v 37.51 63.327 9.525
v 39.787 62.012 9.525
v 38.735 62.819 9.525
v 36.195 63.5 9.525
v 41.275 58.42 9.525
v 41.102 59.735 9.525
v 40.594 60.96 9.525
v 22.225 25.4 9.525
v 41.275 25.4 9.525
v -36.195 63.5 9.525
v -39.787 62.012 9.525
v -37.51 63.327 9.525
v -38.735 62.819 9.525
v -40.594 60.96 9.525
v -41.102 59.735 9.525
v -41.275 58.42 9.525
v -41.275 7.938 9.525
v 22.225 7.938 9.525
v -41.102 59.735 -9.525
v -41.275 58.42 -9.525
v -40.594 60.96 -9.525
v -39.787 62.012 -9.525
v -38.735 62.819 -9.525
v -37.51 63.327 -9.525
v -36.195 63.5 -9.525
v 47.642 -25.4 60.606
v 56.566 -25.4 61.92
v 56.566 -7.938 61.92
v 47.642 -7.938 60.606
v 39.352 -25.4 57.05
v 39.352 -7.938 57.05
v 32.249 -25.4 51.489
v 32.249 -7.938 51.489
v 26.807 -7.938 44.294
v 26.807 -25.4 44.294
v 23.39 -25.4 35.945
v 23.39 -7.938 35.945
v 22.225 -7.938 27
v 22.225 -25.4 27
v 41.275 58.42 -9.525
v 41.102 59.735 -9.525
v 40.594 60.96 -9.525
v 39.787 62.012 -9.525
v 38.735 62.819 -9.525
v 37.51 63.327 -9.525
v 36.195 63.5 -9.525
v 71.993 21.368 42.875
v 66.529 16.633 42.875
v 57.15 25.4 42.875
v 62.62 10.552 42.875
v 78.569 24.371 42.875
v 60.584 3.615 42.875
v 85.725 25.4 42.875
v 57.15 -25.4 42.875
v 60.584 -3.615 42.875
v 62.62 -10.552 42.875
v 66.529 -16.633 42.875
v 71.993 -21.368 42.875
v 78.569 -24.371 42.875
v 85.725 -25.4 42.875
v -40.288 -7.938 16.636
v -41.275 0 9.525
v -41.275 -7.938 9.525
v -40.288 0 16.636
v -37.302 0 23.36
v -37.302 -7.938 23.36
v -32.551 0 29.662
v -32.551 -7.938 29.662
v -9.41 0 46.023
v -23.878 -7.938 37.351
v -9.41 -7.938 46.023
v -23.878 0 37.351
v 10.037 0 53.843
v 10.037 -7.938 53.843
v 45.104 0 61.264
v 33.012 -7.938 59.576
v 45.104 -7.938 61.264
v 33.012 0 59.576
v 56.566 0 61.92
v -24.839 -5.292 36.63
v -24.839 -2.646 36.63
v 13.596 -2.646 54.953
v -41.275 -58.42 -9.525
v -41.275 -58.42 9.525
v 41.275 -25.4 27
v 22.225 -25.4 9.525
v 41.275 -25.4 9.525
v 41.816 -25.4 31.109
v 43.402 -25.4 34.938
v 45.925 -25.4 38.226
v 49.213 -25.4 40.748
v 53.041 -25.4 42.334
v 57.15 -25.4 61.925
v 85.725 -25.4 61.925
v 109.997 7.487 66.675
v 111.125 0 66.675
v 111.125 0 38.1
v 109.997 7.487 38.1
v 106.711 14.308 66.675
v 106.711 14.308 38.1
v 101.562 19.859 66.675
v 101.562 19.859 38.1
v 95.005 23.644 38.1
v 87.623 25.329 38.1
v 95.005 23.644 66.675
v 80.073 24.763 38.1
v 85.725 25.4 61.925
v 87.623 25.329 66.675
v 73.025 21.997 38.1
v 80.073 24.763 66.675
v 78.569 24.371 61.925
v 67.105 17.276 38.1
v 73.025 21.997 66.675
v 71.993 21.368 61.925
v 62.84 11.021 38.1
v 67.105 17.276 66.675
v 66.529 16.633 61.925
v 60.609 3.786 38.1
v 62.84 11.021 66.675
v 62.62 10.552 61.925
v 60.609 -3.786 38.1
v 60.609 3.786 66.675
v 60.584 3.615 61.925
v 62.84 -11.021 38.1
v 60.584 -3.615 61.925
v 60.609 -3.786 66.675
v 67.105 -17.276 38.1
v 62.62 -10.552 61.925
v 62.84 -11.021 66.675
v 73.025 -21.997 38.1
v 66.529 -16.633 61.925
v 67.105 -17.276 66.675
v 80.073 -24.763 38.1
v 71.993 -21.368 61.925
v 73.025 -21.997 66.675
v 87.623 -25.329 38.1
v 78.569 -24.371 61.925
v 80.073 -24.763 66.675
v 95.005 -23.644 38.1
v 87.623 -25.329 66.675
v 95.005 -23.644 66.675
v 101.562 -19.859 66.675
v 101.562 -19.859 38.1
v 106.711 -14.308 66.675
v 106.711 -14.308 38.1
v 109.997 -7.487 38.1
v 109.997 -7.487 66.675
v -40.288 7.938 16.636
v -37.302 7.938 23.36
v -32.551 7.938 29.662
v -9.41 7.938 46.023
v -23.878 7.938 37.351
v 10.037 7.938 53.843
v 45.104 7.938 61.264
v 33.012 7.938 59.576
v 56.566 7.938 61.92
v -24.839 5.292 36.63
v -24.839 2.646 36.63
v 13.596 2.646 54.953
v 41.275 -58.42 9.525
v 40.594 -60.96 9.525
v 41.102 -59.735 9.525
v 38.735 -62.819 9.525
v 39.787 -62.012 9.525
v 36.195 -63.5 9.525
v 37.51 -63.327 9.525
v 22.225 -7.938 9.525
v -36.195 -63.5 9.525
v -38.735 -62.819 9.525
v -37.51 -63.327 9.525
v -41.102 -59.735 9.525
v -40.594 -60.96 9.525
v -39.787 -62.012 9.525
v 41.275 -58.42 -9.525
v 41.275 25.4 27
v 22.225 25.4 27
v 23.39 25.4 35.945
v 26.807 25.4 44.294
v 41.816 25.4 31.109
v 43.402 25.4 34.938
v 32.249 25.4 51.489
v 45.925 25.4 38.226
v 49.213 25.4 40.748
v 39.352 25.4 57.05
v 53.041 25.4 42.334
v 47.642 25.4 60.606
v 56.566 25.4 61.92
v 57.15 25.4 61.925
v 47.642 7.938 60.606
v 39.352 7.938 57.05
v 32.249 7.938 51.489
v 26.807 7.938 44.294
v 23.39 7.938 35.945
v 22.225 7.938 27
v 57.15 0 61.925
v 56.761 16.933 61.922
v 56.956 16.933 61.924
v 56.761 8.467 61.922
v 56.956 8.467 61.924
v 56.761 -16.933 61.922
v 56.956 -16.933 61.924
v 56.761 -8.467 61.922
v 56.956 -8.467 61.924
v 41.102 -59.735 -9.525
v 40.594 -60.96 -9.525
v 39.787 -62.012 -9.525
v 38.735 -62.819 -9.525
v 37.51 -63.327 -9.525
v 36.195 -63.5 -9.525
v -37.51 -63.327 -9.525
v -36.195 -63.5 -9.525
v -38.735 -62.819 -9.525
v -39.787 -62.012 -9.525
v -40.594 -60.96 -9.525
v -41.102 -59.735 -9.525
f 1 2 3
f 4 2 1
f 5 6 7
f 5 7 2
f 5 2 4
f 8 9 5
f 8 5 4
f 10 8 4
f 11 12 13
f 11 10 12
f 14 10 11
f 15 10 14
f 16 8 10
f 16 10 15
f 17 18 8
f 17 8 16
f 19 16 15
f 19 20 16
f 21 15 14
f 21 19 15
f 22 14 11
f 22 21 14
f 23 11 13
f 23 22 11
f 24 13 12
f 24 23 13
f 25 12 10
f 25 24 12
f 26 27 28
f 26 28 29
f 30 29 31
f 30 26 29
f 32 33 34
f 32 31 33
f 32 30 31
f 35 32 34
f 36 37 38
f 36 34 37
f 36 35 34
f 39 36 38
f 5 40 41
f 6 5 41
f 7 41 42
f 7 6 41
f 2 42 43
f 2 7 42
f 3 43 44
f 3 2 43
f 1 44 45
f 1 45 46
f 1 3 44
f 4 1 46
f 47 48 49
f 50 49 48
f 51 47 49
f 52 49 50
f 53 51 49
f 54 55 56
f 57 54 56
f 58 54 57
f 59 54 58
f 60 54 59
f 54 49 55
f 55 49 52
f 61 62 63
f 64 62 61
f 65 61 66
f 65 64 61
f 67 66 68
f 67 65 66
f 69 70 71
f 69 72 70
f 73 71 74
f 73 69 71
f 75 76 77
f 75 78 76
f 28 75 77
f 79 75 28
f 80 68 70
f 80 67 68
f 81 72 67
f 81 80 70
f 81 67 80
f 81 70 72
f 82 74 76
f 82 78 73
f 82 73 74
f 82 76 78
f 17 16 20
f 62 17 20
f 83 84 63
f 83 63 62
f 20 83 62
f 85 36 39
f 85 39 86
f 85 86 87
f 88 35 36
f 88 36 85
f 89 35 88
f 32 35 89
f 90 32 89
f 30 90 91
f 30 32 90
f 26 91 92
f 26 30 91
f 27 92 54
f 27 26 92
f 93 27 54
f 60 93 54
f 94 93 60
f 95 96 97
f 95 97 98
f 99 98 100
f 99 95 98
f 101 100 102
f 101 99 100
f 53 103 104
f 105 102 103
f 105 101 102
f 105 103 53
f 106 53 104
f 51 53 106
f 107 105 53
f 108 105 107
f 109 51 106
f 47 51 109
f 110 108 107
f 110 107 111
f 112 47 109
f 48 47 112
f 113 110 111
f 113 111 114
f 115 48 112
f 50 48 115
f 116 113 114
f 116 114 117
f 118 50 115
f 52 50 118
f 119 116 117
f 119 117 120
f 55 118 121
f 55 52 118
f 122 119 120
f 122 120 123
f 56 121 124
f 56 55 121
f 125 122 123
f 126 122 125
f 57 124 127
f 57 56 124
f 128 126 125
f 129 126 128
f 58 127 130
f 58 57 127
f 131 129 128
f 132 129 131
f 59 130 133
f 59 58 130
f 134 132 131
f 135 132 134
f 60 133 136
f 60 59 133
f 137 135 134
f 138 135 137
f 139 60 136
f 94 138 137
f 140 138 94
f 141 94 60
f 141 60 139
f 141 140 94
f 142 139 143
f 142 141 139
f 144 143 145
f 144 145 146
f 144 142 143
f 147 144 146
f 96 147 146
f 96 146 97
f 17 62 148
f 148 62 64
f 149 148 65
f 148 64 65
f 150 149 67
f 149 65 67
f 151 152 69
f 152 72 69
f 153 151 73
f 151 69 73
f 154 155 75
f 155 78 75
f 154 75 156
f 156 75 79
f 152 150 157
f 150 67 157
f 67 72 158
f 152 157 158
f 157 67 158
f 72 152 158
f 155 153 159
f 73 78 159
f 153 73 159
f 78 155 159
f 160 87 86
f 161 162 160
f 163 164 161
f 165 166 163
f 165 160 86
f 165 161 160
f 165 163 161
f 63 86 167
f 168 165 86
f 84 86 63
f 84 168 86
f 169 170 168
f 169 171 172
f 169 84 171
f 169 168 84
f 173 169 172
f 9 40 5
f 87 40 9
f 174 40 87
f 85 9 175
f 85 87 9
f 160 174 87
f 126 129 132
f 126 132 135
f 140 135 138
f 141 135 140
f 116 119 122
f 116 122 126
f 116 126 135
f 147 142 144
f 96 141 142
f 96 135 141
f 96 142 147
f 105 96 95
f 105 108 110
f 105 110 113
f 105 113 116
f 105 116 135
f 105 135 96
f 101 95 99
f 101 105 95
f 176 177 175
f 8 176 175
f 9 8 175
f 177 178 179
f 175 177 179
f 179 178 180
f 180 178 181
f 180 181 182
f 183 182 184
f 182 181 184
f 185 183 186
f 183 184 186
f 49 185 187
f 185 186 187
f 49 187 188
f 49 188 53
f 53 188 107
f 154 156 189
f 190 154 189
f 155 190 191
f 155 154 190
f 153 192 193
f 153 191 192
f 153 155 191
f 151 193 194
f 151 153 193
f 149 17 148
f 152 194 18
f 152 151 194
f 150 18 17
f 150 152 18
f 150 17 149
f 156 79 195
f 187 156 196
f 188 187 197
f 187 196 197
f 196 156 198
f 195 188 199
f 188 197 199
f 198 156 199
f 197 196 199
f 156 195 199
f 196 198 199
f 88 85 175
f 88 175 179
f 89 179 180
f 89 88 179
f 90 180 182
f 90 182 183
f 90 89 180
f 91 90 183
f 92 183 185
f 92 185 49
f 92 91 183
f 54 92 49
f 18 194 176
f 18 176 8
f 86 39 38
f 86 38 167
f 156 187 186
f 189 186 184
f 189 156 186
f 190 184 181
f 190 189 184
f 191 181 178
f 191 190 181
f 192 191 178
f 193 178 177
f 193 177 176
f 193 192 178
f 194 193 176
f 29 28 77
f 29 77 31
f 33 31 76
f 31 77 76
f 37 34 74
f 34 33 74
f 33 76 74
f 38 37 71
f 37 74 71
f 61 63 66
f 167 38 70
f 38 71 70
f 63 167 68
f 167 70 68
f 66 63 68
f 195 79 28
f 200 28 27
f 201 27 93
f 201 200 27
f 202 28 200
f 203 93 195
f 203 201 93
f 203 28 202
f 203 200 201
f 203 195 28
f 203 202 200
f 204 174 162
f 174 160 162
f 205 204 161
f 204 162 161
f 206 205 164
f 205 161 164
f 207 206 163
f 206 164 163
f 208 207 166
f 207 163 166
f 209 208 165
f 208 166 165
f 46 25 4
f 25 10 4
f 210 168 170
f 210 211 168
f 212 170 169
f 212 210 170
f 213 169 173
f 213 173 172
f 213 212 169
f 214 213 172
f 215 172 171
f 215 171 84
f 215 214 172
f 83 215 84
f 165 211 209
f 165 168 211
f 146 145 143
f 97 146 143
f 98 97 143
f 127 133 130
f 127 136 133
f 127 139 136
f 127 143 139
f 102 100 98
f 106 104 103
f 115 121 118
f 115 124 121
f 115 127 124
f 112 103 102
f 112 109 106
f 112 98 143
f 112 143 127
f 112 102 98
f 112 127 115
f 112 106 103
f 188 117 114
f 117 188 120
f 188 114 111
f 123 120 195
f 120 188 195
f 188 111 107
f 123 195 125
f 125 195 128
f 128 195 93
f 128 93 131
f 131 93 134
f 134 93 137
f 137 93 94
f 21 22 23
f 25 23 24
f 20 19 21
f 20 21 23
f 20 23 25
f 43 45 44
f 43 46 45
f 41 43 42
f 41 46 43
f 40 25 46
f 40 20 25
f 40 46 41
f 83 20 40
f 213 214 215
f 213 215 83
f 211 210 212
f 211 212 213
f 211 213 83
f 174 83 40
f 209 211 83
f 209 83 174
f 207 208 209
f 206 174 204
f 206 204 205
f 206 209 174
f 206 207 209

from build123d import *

# Parameters (mm, degrees)
F1_DEPTH = 63.5
F2_DEPTH = 7.9375
F3_DEPTH = 25.4
F0_W     = 25.4
F0_H     = 19.05
F4_DEPTH = 25.4
F6_R     = 5.08


# Not quite as in the source:
# - a feature names something its author has since deleted; it is built from what else it names


with BuildPart() as f1:
    # F0 (on Front) → F1 (new body, symmetric)
    with BuildSketch(Plane.XZ):
        Polygon((22.225, 9.525), (-41.275, 9.525), (-41.275, -9.525), (41.275, -9.525), (41.275, 9.525), align=None)
    extrude(amount=F1_DEPTH, both=True)

    # F0 (on Front) → F2 (join, symmetric)
    with BuildSketch(Plane.XZ):
        with BuildLine():
            add(Edge.make_bspline(
                [(-41.275, 9.525), (-41.6611139955, 40.1644010986), (17.1509007839, 61.4882749154), (56.5663251016, 61.9203224026)],
                knots=[0, 0, 0, 0, 110.9555033405, 110.9555033405, 110.9555033405, 110.9555033405], degree=3))
            Line((-41.275, 9.525), (22.225, 9.525))
            Line((22.225, 9.525), (22.225, 27.0002))
            ThreePointArc((22.225, 27.0002), (32.2487904829, 51.4886746276), (56.5663251016, 61.9203224026))
        make_face()
    extrude(amount=F2_DEPTH, both=True)

    # F0 (on Front) → F3 (join, symmetric)
    with BuildSketch(Plane.XZ):
        with BuildLine():
            Line((22.225, 27.0002), (22.225, 9.525))
            Line((22.225, 9.525), (41.275, 9.525))
            Line((41.275, 9.525), (41.275, 27.0002))
            ThreePointArc((41.275, 27.0002), (45.9246798487, 38.2255201513), (57.15, 42.8752))
            Line((57.15, 42.8752), (60.325, 42.8752))
            Line((60.325, 42.8752), (60.325, 61.9252))
            Line((60.325, 61.9252), (57.15, 61.9252))
            add(Edge.make_bspline(
                [(56.5663251016, 61.9203224026), (56.7613614994, 61.9224602709), (56.955922973, 61.9240866042), (57.15, 61.9252)],
                knots=[110.9555033405, 110.9555033405, 110.9555033405, 110.9555033405, 111.5045361635, 111.5045361635, 111.5045361635, 111.5045361635], degree=3))
            ThreePointArc((56.5663251016, 61.9203224026), (32.2487904829, 51.4886746276), (22.225, 27.0002))
        make_face()
    extrude(amount=F3_DEPTH, both=True)

    # F0 (on Front) → F4 (join, symmetric)
    with BuildSketch(Plane.XZ):
        with Locations((73.025, 52.4002)):
            Rectangle(F0_W, F0_H)
    extrude(amount=F4_DEPTH, both=True)

    # F0 (on Front) → F5 (revolve)
    with BuildSketch(Plane.XZ):
        Polygon((85.725, 66.675), (85.725, 61.9252), (85.725, 42.8752), (85.725, 38.1), (111.125, 38.1), (111.125, 66.675), align=None)
    revolve(axis=Axis((85.725, 0, 52.3875), (0, 0, 1)))

    # F6
    f6_edges = [f1.edges().sort_by_distance(p)[0] for p in [
        (-41.275, -63.5, 0),
        (41.275, -63.5, 0),
        (41.275, 63.5, 0),
        (-41.275, 63.5, 0),
    ]]
    fillet(f6_edges, radius=F6_R)


solid = f1.part
